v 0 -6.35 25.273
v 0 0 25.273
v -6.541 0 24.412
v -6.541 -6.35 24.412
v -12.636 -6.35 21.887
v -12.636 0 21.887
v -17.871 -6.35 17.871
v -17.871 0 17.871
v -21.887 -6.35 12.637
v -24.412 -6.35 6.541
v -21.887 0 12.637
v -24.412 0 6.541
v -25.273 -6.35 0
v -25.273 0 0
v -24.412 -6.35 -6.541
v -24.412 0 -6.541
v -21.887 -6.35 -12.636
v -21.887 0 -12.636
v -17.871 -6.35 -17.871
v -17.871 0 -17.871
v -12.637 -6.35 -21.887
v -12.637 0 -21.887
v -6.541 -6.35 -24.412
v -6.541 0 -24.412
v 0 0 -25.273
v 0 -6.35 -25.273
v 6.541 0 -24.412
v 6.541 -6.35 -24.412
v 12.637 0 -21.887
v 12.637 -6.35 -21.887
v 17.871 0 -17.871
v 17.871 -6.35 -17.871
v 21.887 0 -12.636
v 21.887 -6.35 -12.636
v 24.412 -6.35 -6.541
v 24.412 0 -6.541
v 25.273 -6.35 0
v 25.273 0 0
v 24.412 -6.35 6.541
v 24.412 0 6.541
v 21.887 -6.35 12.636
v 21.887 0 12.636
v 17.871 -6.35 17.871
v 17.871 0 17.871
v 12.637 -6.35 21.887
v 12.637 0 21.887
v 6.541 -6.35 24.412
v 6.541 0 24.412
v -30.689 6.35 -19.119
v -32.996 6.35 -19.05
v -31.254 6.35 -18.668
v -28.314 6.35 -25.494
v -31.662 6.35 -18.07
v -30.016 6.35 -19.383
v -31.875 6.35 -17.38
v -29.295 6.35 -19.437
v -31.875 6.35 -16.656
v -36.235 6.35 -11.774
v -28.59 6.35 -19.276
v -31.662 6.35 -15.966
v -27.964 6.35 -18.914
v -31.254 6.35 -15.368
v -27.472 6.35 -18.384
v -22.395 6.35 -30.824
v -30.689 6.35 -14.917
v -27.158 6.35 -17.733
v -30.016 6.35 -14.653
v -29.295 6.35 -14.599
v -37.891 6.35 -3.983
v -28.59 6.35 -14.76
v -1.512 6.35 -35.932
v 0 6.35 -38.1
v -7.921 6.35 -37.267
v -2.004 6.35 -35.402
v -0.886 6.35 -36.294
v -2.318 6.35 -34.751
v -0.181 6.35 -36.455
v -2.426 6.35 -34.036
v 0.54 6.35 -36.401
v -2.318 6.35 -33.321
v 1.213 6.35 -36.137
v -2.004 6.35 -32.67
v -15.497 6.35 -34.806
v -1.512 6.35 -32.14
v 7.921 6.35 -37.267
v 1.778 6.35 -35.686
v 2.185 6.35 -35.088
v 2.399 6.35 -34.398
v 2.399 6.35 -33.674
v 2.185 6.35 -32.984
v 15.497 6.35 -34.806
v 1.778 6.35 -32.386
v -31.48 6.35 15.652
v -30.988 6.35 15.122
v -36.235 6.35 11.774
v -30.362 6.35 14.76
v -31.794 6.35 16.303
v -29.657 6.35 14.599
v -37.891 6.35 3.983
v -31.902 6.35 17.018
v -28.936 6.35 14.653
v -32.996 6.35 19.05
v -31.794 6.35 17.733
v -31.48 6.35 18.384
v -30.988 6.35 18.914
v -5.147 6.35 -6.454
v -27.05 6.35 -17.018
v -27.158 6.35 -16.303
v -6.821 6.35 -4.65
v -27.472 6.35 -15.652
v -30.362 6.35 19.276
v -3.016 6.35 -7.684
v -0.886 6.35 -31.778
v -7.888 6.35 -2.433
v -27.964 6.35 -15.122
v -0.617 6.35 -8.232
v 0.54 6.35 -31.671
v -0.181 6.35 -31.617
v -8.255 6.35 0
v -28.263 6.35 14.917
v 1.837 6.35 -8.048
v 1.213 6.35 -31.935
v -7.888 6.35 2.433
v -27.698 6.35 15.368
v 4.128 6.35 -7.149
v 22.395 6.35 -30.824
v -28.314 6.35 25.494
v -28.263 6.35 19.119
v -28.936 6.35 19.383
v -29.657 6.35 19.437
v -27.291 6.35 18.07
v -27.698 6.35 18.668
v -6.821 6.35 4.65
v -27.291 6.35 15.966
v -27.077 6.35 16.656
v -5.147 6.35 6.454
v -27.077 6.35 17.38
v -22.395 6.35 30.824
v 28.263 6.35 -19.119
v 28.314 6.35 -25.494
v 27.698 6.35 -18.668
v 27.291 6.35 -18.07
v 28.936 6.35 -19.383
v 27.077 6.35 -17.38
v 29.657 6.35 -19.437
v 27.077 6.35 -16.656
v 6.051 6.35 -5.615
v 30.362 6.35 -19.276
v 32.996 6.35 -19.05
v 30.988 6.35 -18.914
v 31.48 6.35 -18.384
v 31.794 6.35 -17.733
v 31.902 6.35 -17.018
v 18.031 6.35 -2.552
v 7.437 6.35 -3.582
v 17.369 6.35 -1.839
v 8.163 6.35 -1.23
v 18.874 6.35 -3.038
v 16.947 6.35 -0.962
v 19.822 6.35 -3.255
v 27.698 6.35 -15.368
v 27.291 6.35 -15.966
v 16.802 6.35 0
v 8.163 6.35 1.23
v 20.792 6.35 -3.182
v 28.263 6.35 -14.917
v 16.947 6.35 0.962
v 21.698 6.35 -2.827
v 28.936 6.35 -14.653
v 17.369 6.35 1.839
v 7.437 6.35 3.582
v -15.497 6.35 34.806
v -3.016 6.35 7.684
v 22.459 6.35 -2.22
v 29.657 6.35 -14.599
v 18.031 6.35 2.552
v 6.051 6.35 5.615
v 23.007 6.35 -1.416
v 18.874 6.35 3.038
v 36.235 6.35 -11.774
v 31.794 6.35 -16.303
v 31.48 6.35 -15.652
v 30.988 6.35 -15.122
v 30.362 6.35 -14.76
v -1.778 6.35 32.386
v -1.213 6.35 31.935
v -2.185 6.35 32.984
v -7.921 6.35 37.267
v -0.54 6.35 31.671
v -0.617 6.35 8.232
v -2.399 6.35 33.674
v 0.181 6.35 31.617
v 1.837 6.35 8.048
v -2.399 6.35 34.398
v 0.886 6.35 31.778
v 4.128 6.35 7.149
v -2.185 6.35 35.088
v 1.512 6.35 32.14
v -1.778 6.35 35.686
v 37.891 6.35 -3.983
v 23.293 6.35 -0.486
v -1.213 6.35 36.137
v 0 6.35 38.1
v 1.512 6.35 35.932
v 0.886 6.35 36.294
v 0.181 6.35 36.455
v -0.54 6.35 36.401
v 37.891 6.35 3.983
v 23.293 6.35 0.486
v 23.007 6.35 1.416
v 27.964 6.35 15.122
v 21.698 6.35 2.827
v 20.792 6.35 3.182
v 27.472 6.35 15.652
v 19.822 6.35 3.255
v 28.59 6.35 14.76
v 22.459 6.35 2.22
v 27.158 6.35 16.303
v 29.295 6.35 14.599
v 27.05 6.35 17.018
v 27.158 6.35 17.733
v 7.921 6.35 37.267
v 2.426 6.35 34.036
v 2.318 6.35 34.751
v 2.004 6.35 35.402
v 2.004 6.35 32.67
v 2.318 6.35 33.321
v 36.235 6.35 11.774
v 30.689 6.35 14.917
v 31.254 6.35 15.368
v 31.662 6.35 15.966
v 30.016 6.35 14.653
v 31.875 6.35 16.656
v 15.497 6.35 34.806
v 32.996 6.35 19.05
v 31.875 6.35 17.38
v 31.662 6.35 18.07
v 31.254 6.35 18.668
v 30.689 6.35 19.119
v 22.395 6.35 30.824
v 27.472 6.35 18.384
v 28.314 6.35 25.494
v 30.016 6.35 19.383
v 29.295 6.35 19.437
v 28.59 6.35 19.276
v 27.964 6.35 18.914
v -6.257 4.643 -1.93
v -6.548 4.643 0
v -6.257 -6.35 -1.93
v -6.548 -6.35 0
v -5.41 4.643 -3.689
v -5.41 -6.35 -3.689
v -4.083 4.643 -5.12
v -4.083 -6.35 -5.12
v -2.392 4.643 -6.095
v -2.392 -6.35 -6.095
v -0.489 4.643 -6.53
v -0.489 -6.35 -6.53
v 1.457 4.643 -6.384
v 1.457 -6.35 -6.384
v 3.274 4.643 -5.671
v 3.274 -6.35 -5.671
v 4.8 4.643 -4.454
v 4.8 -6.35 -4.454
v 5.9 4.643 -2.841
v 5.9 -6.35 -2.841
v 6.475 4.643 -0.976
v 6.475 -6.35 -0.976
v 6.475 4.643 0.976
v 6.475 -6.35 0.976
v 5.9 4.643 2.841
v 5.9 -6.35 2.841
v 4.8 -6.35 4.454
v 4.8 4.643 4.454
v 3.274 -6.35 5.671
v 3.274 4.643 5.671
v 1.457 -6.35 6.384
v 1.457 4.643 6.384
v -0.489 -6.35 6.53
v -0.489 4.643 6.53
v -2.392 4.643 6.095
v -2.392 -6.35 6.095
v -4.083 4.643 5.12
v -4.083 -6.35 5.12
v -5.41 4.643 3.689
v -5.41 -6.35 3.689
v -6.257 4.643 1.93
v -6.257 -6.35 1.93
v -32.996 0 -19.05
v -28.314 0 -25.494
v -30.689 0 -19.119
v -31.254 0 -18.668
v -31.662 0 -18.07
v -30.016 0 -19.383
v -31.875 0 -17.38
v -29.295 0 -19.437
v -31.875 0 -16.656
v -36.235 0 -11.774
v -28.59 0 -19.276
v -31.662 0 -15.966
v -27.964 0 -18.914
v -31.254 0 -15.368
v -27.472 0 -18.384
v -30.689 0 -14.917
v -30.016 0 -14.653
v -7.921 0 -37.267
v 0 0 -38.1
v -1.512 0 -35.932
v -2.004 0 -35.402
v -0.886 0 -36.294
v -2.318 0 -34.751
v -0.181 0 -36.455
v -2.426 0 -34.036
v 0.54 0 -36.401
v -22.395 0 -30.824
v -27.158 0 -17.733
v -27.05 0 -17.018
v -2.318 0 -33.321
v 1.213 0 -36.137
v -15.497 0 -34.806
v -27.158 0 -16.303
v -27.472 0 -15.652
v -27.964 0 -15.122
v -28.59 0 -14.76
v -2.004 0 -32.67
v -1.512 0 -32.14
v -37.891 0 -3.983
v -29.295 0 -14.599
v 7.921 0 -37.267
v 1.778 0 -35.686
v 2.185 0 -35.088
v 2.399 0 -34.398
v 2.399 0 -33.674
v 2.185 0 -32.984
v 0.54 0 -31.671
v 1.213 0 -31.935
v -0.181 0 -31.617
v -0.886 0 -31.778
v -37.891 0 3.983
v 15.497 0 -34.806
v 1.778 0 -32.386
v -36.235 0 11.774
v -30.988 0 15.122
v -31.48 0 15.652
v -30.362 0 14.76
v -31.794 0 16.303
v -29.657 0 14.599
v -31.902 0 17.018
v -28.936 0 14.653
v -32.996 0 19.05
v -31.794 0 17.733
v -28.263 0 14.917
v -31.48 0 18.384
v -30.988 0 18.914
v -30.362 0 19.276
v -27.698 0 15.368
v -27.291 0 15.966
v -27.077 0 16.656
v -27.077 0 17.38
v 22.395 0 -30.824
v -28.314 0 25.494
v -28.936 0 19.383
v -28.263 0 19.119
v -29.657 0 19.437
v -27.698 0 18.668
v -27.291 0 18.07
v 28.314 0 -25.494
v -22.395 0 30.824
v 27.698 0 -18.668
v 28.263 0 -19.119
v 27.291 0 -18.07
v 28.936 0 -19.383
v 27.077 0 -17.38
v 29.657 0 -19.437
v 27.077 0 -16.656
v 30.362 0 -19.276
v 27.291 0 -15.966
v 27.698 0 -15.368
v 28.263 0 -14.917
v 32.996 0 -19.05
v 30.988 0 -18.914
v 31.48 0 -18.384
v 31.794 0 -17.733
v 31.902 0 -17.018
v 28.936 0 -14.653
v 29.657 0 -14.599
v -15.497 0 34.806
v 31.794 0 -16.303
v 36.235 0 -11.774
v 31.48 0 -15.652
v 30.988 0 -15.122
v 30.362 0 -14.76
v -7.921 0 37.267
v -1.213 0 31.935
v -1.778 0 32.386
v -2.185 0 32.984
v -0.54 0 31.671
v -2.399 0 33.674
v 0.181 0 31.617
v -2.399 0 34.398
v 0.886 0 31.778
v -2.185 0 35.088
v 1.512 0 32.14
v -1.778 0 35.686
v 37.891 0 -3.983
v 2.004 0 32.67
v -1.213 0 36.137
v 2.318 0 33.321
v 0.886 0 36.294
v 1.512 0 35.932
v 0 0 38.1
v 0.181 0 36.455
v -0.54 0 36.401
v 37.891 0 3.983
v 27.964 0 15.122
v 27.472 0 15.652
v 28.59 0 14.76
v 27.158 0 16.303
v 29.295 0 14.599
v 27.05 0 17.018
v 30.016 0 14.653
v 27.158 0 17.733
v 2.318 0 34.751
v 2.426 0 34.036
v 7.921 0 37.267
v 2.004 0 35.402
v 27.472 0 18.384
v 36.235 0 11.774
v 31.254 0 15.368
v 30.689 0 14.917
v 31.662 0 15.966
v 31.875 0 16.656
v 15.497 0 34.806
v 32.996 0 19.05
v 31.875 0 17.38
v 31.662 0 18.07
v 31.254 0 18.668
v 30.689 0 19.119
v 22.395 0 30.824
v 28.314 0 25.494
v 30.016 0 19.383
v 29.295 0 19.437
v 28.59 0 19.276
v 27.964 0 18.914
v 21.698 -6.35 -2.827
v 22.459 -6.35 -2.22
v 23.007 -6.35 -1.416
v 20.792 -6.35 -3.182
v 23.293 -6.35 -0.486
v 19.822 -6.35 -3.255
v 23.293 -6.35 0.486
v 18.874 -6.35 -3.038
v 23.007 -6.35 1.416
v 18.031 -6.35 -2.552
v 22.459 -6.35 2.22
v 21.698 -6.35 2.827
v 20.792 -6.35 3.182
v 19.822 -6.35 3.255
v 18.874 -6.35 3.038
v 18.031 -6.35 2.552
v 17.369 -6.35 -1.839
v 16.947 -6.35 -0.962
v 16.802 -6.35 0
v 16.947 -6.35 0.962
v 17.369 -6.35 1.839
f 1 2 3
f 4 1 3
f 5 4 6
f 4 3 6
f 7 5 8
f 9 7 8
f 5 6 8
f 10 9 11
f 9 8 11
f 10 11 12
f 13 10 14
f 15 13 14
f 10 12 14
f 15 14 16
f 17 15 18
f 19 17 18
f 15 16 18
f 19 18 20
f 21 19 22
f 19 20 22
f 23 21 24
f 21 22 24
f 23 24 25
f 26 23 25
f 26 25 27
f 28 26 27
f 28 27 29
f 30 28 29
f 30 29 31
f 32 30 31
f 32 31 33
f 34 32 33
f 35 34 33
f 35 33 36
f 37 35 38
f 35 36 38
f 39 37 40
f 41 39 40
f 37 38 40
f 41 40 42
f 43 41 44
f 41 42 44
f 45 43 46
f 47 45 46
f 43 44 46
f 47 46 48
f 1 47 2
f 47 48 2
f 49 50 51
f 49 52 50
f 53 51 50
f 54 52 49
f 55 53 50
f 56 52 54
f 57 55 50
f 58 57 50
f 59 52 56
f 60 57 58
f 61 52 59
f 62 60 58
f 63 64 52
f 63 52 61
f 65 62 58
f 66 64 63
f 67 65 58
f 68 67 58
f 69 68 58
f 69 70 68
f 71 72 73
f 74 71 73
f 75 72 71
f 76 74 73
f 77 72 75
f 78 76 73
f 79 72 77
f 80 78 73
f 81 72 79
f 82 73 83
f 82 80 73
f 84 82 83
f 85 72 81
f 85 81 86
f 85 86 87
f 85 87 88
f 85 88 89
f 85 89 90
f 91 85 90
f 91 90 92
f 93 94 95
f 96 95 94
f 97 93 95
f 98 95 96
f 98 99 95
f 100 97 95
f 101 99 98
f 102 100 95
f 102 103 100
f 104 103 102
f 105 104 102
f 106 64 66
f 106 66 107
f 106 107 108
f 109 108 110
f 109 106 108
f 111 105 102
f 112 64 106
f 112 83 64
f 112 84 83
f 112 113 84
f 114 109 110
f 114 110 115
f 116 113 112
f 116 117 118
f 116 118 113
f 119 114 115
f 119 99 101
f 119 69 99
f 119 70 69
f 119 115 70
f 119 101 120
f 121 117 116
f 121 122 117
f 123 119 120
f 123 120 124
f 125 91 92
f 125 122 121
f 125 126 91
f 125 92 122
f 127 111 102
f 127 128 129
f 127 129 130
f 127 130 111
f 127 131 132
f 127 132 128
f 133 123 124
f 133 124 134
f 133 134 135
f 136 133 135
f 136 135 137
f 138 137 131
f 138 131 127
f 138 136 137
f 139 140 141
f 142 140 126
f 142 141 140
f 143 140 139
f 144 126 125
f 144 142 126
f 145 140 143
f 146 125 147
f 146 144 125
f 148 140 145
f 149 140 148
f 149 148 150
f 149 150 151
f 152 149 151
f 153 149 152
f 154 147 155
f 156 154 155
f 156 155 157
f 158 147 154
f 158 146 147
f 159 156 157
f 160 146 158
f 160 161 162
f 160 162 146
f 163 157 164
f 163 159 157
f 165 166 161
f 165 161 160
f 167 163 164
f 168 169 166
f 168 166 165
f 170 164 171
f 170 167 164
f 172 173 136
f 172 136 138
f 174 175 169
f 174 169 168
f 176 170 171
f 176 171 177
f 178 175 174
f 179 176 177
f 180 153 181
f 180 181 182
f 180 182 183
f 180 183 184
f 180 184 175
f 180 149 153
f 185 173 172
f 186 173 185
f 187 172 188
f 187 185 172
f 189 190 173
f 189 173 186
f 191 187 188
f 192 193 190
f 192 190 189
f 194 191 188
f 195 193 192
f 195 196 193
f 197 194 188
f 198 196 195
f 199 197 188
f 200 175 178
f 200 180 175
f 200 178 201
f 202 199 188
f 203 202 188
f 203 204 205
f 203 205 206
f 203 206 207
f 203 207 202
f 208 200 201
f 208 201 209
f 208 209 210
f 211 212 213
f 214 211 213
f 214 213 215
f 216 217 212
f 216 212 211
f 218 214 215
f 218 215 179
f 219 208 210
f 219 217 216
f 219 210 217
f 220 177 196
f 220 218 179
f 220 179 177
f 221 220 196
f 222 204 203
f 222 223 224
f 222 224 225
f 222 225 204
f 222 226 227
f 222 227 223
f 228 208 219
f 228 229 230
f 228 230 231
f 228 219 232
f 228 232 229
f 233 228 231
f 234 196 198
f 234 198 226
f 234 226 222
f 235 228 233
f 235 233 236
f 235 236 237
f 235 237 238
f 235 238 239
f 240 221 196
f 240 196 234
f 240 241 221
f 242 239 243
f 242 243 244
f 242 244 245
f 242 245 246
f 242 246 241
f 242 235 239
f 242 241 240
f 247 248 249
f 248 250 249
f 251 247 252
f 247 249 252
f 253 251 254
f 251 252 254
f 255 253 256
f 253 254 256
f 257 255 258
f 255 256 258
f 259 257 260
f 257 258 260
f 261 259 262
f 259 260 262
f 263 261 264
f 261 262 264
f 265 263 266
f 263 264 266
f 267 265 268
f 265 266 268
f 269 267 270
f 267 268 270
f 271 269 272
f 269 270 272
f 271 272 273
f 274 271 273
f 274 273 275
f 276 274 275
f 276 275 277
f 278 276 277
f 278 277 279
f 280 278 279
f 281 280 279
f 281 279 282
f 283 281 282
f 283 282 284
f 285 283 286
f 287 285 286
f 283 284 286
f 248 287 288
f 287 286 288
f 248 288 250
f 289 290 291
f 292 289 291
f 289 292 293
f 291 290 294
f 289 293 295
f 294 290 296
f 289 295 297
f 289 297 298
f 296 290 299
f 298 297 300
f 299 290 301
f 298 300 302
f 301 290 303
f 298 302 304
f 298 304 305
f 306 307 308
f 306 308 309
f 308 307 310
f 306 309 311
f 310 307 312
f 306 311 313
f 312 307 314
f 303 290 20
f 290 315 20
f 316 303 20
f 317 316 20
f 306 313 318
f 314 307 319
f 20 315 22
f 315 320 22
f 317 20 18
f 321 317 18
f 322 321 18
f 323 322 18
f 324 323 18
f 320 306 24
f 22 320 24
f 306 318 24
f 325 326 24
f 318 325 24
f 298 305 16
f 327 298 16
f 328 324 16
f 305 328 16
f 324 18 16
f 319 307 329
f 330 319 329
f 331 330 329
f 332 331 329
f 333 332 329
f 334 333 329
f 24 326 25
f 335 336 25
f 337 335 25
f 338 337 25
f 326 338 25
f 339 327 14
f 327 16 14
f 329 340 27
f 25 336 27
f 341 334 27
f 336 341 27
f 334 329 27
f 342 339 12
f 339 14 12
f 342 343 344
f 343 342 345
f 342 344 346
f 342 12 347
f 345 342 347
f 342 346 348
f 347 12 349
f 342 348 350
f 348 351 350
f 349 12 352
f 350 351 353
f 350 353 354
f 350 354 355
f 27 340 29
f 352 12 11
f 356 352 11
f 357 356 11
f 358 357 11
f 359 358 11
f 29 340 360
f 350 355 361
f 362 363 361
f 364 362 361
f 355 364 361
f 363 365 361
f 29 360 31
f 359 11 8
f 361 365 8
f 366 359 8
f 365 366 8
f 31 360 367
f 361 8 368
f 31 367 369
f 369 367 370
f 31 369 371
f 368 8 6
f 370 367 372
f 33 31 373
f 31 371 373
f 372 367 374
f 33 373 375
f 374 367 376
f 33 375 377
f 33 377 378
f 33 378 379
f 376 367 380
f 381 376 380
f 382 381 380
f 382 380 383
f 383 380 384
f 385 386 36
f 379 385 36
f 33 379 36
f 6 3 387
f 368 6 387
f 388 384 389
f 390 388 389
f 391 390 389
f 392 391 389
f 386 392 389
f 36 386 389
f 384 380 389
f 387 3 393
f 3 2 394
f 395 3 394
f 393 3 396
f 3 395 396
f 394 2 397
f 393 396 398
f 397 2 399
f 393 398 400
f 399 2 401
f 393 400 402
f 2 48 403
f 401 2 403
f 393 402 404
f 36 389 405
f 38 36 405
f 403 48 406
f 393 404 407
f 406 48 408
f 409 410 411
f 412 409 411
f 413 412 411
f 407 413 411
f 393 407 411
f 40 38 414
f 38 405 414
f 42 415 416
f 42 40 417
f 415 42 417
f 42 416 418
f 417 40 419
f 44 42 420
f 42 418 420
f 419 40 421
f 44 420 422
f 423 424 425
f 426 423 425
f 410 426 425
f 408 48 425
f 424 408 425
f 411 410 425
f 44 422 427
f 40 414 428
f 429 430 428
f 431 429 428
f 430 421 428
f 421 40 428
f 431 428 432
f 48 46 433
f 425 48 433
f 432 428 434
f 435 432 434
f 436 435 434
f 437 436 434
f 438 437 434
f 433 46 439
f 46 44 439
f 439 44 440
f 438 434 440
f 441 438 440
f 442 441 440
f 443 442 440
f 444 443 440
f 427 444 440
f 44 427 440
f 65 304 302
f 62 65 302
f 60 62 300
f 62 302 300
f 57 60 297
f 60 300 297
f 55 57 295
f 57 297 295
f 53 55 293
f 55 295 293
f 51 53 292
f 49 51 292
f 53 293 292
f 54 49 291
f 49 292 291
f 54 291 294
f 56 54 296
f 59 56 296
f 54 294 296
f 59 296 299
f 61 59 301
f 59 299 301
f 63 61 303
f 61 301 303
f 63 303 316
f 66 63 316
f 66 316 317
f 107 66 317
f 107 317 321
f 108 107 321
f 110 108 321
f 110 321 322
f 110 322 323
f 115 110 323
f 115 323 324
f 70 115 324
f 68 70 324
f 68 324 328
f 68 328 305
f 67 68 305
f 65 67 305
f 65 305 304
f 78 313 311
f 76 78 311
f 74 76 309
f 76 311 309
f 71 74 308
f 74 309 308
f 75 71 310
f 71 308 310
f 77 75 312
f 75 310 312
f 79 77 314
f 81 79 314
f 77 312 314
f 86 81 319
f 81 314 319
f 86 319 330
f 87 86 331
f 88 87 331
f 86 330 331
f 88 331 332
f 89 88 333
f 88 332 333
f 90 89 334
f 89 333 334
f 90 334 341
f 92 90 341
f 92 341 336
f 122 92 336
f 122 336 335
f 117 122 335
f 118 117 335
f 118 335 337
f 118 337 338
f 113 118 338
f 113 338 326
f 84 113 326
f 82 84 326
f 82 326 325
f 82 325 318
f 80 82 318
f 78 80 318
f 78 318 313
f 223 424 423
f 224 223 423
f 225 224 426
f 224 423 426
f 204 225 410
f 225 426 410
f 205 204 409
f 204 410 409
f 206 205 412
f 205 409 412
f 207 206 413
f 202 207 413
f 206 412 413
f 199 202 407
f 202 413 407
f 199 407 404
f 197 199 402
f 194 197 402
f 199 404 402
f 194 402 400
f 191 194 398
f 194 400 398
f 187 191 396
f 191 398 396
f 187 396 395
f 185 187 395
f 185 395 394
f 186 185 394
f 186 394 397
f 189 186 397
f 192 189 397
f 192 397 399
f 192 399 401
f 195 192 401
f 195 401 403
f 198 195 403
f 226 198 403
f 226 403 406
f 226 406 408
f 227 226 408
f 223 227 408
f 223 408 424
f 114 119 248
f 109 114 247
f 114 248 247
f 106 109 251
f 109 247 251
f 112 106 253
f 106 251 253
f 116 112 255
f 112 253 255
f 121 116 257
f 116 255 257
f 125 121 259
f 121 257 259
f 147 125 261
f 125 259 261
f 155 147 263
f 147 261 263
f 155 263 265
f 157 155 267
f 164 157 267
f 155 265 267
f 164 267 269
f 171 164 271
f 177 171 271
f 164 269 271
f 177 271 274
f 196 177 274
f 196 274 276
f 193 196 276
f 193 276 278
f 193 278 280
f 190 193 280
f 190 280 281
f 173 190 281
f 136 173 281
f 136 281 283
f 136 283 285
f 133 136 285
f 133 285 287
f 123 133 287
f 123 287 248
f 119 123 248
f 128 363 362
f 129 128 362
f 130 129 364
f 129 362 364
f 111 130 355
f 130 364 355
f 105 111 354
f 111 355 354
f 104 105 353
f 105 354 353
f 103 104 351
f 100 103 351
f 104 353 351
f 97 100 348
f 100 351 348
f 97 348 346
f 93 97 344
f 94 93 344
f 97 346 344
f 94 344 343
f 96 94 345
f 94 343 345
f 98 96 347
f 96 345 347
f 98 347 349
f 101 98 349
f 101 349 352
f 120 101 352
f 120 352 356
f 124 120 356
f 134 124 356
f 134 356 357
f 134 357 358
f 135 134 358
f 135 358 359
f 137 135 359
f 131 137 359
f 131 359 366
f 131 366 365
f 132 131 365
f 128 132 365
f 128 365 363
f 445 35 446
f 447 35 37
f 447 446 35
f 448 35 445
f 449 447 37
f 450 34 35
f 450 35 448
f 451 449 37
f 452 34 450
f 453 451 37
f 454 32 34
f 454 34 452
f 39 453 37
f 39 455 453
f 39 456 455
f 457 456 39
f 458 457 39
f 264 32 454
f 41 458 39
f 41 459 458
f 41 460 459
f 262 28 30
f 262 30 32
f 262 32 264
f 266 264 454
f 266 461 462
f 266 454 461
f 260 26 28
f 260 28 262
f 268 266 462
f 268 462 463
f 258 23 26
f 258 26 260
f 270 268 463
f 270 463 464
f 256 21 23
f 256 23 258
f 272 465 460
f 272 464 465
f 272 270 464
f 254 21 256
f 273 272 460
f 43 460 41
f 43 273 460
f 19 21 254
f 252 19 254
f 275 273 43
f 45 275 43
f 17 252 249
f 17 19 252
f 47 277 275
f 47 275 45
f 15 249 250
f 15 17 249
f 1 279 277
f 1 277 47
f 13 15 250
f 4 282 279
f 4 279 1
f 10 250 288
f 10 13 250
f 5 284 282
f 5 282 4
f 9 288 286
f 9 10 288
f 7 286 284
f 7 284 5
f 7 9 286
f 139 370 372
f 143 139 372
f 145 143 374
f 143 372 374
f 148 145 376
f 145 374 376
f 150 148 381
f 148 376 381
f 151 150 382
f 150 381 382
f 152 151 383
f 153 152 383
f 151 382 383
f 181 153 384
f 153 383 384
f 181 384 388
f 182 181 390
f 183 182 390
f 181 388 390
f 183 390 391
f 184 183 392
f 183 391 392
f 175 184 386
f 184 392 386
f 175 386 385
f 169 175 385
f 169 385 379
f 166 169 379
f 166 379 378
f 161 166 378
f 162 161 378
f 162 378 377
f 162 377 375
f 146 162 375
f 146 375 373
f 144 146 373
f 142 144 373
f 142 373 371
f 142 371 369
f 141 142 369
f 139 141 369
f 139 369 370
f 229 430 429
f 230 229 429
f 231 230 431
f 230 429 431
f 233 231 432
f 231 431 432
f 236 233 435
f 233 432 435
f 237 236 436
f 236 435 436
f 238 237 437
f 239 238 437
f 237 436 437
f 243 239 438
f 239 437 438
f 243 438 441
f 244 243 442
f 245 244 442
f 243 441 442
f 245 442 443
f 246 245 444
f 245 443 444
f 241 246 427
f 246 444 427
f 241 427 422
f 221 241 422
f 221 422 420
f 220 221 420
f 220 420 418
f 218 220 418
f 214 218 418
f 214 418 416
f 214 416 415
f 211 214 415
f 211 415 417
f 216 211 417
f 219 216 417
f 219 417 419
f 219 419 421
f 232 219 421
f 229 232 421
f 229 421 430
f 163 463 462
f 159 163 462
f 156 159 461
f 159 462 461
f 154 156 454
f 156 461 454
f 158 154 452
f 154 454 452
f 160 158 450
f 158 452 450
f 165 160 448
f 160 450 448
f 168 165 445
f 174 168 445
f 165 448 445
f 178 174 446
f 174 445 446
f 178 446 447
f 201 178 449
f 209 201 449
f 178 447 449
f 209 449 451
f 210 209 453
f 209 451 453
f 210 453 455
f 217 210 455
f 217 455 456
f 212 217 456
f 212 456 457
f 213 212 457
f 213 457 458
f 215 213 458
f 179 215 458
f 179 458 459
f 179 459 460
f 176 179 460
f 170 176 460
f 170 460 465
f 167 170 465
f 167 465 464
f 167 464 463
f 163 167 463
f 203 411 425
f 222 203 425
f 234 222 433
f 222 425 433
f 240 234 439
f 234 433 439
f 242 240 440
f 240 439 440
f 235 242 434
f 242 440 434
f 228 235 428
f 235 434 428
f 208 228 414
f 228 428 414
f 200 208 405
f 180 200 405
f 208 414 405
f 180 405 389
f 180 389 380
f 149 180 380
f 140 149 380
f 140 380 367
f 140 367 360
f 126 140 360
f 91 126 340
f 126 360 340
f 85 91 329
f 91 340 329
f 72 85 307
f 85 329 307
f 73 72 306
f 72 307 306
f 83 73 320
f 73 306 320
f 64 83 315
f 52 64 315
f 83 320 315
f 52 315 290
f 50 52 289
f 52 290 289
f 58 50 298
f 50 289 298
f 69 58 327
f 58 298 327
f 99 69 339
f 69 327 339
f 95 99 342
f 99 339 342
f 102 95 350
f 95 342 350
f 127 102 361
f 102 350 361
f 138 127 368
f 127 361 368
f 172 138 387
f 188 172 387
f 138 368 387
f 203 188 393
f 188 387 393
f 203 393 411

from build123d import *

# Parameters (mm, degrees)
SKETCH1_R                          = 38.1
BOSS_EXTRUDE1_DEPTH                = 6.35
SKETCH2_R                          = 25.273
BOSS_EXTRUDE2_DEPTH                = 6.35
F_11_0_191_DIAMETER_HOLE1_D        = 4.8514
CIRPATTERN1_COUNT                  = 6
F_9_16_18_TAPPED_HOLE1_D           = 13.09624
F_9_16_18_TAPPED_HOLE1_CSINK_D     = 16.51
F_9_16_18_TAPPED_HOLE1_CSINK_ANGLE = 90
F_0_257_DIAMETER_HOLE1_D           = 6.5278


with BuildPart() as part:
    # Sketch1 → Boss-Extrude1 (new body)
    with BuildSketch(Plane(origin=(0, 0, 0), x_dir=(1, 0, 0), z_dir=(0, 1, 0))):
        with Locations(Location((0, 0, 0), (0, 0, 270))):
            Circle(SKETCH1_R)
    extrude(amount=BOSS_EXTRUDE1_DEPTH)

    # Sketch2 → Boss-Extrude2 (add)
    with BuildSketch(Plane(origin=(0, 0, 0), x_dir=(-1, 0, 0), z_dir=(0, -1, 0))):
        with Locations(Location((0, 0, 0), (0, 0, 270))):
            Circle(SKETCH2_R)
    extrude(amount=BOSS_EXTRUDE2_DEPTH)

    # #11 (0.191) Diameter Hole1 (through all)
    with Locations(Plane(origin=(0, 6.35, 0), x_dir=(1, 0, 0), z_dir=(0, 1, 0))):
        with Locations((0, 34.036)):
            f_11_0_191_diameter_hole1 = Hole(F_11_0_191_DIAMETER_HOLE1_D / 2)

    # CirPattern1: #11 (0.191) Diameter Hole1 ×6 about axis
    cirpattern1_axis = Axis((0, 0, 0), (0, 1, 0))
    for i in range(1, CIRPATTERN1_COUNT):
        add(f_11_0_191_diameter_hole1.rotate(cirpattern1_axis, i * 360 / CIRPATTERN1_COUNT), mode=Mode.SUBTRACT)

    # 9/16-18 Tapped Hole1 (through all)
    with Locations(Plane(origin=(0, 6.35, 0), x_dir=(1, 0, 0), z_dir=(0, 1, 0))):
        with Locations((0, 0)):
            CounterSinkHole(F_9_16_18_TAPPED_HOLE1_D / 2, F_9_16_18_TAPPED_HOLE1_CSINK_D / 2, counter_sink_angle=F_9_16_18_TAPPED_HOLE1_CSINK_ANGLE)

    # F (0.257) Diameter Hole1 (through all)
    with Locations(Plane(origin=(0, 6.35, 0), x_dir=(1, 0, 0), z_dir=(0, 1, 0))):
        with Locations((20.066, 0)):
            Hole(F_0_257_DIAMETER_HOLE1_D / 2)


solid = part.part
